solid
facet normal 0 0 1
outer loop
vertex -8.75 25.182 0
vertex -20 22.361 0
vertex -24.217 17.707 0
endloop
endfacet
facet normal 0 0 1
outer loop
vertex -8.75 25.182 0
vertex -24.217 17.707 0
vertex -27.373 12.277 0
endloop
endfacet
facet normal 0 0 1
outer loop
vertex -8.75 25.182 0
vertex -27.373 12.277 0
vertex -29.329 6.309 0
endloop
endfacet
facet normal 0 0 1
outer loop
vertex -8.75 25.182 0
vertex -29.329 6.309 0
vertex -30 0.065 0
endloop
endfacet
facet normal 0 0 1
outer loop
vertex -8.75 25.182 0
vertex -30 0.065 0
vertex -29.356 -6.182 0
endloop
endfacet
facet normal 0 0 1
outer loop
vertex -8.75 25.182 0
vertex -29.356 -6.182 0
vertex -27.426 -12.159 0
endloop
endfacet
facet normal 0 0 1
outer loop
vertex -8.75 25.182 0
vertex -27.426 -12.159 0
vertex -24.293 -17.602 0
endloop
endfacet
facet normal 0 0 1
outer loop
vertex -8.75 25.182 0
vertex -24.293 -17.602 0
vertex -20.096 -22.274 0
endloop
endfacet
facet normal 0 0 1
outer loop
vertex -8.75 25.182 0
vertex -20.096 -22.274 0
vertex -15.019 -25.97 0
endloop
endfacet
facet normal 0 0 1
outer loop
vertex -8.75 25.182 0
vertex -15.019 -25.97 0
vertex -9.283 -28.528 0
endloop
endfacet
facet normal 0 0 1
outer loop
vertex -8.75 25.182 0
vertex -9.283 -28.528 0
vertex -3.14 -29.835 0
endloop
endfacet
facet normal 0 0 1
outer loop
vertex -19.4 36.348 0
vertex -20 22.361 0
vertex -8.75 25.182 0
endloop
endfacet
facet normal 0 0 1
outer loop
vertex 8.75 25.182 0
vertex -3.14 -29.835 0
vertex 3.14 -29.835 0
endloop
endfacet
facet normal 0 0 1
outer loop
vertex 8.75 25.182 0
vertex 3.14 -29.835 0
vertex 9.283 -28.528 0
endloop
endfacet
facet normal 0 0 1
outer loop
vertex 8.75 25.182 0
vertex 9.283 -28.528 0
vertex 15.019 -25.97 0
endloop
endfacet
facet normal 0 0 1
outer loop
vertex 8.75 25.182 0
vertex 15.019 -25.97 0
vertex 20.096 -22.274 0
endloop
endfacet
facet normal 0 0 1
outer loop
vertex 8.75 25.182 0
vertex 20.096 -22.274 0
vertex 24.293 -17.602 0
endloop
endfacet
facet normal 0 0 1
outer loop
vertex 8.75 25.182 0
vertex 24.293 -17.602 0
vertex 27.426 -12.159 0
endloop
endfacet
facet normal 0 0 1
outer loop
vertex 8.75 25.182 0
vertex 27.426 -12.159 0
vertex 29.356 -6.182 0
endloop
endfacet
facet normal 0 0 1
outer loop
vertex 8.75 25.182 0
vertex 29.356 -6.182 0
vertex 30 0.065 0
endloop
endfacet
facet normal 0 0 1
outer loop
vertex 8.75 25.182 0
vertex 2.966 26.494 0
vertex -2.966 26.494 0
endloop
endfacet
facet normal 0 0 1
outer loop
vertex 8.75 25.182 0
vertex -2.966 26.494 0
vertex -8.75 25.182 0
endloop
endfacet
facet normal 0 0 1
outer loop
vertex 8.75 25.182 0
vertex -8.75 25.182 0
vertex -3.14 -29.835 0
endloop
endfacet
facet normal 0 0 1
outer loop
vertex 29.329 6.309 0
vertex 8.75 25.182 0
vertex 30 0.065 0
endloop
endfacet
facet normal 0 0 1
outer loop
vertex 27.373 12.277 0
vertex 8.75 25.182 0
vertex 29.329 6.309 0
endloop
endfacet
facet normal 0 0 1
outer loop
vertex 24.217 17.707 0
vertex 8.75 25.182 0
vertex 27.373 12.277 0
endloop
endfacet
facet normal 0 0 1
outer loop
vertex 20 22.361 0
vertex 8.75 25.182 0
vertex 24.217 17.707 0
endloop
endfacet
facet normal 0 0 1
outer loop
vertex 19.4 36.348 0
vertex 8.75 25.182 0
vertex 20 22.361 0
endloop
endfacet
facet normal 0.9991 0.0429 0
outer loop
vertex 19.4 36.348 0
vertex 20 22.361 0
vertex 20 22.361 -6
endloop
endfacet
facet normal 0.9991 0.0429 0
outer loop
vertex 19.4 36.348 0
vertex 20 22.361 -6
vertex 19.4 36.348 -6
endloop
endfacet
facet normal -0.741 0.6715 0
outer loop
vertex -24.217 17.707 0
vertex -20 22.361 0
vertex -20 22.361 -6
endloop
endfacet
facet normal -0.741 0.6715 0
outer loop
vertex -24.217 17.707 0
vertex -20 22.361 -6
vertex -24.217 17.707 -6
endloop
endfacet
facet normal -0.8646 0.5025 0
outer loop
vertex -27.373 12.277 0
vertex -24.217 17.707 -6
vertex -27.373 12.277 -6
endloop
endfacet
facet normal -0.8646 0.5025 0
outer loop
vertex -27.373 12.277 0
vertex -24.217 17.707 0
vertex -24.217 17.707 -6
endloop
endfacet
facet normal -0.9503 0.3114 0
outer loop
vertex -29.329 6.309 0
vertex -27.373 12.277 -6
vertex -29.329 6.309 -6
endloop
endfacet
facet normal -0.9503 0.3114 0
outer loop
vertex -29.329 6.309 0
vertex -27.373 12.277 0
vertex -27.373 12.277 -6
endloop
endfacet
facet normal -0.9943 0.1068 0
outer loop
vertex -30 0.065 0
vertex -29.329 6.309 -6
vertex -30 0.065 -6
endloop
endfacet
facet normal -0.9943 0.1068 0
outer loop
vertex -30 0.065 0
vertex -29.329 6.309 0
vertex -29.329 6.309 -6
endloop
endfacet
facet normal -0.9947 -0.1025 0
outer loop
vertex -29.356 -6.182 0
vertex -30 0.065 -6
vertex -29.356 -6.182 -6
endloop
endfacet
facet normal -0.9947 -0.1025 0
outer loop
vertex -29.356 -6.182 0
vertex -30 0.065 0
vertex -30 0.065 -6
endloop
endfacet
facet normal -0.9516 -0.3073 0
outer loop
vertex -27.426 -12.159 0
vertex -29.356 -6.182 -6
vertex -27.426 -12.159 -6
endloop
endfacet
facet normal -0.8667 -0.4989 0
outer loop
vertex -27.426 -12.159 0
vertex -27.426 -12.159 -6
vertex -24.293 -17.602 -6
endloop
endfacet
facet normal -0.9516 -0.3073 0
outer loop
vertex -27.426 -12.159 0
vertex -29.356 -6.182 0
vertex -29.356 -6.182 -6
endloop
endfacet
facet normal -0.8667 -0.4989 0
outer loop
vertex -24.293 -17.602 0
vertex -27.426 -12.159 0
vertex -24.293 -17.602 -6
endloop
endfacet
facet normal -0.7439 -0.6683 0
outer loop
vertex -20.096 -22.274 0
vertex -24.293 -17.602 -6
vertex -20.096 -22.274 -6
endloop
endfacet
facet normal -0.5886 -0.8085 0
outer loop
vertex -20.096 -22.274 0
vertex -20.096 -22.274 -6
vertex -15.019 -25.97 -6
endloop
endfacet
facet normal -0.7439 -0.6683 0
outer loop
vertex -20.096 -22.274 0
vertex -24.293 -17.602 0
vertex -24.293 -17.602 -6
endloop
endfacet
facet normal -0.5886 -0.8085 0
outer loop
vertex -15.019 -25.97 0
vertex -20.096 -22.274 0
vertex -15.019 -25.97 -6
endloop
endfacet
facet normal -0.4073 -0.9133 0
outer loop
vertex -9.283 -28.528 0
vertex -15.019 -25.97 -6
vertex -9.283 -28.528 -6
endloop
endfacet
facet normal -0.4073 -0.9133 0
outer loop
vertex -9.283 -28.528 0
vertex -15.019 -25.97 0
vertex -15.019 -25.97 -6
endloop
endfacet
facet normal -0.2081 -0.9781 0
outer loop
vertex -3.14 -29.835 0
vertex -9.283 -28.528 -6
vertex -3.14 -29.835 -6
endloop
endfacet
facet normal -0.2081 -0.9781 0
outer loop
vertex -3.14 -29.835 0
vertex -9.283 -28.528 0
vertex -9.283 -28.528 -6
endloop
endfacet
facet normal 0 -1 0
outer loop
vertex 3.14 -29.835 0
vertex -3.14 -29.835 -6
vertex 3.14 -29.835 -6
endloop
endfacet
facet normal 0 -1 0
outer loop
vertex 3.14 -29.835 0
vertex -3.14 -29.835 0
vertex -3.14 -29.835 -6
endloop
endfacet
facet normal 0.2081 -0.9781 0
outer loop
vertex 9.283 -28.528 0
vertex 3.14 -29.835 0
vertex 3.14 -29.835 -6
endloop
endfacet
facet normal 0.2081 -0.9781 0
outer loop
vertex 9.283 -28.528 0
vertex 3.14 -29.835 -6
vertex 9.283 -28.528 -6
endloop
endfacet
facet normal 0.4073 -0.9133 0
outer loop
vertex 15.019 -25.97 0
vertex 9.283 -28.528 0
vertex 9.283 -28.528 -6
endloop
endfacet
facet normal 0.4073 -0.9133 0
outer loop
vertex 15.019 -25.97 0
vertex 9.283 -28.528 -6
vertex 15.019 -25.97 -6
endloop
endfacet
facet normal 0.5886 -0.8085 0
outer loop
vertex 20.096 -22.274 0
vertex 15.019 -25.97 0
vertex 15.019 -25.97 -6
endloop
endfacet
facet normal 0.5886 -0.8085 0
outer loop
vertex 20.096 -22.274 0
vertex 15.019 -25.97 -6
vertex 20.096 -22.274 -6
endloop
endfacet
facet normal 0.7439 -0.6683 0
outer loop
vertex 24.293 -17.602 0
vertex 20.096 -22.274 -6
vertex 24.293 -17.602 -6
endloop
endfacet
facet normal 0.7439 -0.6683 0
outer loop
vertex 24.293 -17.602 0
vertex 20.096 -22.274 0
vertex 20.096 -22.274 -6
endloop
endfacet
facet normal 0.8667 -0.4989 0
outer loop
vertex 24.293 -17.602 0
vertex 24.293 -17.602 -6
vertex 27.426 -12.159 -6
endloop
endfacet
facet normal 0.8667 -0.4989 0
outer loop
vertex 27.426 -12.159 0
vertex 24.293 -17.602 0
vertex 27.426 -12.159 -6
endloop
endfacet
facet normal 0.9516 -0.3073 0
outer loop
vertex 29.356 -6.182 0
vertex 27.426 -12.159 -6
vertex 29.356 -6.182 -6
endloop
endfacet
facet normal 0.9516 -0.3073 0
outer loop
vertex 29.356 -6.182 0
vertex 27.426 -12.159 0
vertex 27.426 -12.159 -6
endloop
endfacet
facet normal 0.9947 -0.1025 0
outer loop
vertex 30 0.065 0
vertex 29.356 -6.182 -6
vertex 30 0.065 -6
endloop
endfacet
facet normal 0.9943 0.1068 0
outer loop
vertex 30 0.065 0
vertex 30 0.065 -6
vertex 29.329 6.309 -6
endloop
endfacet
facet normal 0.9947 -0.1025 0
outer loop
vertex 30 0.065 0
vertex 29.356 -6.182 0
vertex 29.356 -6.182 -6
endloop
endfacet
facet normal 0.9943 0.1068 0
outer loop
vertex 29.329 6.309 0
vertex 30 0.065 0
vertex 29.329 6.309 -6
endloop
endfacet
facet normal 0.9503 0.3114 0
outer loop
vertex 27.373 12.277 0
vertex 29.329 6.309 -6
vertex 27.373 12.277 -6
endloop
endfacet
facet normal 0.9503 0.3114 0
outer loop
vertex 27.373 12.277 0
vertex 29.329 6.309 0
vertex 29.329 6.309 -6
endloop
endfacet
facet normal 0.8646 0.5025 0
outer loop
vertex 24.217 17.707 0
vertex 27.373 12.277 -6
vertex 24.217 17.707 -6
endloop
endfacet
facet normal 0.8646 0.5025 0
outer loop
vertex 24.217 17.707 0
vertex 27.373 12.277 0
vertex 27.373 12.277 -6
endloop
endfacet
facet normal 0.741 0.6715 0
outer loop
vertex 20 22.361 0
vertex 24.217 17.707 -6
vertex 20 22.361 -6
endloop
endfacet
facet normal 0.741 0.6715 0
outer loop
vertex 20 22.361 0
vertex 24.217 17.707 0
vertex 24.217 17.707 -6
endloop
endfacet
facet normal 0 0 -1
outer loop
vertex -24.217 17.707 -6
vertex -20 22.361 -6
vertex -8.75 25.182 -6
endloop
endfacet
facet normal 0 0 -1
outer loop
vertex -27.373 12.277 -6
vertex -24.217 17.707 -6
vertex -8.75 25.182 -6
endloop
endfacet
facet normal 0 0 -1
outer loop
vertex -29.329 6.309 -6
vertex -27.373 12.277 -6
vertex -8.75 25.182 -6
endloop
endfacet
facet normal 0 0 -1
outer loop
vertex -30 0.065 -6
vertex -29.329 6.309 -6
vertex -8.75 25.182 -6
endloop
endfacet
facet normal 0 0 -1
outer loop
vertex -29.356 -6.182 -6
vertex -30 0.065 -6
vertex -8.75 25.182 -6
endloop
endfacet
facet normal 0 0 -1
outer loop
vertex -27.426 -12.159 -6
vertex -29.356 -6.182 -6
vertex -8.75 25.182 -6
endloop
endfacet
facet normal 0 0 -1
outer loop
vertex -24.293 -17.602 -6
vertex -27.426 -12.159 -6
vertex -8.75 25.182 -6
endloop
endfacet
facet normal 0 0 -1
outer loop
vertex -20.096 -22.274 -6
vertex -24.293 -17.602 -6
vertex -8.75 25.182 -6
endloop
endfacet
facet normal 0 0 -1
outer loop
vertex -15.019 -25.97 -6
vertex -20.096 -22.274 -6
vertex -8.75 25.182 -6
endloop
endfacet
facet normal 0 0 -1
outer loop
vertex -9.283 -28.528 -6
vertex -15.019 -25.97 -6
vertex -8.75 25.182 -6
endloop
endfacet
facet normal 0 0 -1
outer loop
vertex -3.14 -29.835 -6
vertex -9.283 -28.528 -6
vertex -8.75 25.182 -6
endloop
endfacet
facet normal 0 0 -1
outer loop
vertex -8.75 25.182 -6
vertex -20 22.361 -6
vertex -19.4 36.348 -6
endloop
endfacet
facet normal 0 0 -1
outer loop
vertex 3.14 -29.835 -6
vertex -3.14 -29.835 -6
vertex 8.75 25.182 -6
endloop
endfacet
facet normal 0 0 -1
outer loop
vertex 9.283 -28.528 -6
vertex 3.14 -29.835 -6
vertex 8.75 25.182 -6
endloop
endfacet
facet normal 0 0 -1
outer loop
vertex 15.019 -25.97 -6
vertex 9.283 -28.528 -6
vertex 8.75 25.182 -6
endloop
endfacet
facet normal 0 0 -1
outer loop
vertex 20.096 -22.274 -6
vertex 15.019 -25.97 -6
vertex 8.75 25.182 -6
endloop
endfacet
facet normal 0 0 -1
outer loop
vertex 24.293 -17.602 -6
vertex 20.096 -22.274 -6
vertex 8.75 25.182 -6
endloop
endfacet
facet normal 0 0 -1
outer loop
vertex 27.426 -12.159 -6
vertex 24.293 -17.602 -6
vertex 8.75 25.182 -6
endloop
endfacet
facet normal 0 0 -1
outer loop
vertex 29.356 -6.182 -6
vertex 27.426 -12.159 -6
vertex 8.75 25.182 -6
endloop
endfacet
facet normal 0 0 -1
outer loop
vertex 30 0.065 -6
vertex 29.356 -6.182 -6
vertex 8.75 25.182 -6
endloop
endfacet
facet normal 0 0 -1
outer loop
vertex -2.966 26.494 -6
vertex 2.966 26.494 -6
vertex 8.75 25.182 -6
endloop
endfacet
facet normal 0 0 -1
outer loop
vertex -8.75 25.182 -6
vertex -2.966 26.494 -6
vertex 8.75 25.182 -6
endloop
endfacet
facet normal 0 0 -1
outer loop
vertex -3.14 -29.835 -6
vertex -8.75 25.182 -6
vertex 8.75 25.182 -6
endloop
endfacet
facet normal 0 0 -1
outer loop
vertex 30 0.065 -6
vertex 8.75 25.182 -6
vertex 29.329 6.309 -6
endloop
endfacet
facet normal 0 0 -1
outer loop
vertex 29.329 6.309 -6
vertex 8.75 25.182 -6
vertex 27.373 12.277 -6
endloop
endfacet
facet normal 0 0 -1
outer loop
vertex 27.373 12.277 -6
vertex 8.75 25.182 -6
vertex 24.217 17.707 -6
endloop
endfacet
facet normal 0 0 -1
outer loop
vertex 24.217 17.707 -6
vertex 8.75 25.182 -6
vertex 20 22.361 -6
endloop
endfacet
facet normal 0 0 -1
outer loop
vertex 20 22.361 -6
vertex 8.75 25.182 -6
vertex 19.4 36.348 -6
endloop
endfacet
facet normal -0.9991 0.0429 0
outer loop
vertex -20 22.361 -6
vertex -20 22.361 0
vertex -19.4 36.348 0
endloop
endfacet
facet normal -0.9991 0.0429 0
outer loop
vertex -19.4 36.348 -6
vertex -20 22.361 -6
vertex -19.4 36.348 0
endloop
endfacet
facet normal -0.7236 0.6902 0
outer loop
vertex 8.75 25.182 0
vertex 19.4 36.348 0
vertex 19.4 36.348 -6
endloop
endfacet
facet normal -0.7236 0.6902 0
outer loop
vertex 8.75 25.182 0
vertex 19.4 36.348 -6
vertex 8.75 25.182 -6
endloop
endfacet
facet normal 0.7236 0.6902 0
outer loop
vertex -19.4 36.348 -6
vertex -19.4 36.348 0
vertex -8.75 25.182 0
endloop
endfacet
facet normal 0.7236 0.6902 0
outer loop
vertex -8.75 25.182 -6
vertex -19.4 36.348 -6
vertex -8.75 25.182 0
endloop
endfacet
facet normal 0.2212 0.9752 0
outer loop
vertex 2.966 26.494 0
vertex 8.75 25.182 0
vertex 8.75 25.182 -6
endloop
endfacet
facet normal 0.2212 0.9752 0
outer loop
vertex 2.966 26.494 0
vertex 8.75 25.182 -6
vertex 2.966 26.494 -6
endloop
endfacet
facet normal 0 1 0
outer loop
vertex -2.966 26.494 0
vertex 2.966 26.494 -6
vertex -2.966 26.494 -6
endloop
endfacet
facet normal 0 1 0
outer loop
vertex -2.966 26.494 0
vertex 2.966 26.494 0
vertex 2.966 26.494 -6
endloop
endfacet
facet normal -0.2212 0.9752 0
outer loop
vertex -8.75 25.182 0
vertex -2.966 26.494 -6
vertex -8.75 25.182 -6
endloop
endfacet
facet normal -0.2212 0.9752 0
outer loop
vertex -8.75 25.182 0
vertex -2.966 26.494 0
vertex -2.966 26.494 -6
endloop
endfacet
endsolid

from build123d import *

# Parameters (mm, degrees)
PAD_DEPTH = 6


with BuildPart() as part:
    # Sketch → Pad (new body)
    with BuildSketch(Plane.XY):
        with BuildLine():
            ThreePointArc((-20, 22.36068), (0, -30), (20, 22.36068))
            Line((20, 22.36068), (19.400305, 36.34783))
            Line((19.400305, 36.34783), (8.749783, 25.182296))
            ThreePointArc((8.749783, 25.182296), (0, 26.659084), (-8.749783, 25.182296))
            Line((-19.400305, 36.34783), (-8.749783, 25.182296))
            Line((-20, 22.36068), (-19.400305, 36.34783))
        make_face()
    extrude(amount=-PAD_DEPTH)


solid = part.part
